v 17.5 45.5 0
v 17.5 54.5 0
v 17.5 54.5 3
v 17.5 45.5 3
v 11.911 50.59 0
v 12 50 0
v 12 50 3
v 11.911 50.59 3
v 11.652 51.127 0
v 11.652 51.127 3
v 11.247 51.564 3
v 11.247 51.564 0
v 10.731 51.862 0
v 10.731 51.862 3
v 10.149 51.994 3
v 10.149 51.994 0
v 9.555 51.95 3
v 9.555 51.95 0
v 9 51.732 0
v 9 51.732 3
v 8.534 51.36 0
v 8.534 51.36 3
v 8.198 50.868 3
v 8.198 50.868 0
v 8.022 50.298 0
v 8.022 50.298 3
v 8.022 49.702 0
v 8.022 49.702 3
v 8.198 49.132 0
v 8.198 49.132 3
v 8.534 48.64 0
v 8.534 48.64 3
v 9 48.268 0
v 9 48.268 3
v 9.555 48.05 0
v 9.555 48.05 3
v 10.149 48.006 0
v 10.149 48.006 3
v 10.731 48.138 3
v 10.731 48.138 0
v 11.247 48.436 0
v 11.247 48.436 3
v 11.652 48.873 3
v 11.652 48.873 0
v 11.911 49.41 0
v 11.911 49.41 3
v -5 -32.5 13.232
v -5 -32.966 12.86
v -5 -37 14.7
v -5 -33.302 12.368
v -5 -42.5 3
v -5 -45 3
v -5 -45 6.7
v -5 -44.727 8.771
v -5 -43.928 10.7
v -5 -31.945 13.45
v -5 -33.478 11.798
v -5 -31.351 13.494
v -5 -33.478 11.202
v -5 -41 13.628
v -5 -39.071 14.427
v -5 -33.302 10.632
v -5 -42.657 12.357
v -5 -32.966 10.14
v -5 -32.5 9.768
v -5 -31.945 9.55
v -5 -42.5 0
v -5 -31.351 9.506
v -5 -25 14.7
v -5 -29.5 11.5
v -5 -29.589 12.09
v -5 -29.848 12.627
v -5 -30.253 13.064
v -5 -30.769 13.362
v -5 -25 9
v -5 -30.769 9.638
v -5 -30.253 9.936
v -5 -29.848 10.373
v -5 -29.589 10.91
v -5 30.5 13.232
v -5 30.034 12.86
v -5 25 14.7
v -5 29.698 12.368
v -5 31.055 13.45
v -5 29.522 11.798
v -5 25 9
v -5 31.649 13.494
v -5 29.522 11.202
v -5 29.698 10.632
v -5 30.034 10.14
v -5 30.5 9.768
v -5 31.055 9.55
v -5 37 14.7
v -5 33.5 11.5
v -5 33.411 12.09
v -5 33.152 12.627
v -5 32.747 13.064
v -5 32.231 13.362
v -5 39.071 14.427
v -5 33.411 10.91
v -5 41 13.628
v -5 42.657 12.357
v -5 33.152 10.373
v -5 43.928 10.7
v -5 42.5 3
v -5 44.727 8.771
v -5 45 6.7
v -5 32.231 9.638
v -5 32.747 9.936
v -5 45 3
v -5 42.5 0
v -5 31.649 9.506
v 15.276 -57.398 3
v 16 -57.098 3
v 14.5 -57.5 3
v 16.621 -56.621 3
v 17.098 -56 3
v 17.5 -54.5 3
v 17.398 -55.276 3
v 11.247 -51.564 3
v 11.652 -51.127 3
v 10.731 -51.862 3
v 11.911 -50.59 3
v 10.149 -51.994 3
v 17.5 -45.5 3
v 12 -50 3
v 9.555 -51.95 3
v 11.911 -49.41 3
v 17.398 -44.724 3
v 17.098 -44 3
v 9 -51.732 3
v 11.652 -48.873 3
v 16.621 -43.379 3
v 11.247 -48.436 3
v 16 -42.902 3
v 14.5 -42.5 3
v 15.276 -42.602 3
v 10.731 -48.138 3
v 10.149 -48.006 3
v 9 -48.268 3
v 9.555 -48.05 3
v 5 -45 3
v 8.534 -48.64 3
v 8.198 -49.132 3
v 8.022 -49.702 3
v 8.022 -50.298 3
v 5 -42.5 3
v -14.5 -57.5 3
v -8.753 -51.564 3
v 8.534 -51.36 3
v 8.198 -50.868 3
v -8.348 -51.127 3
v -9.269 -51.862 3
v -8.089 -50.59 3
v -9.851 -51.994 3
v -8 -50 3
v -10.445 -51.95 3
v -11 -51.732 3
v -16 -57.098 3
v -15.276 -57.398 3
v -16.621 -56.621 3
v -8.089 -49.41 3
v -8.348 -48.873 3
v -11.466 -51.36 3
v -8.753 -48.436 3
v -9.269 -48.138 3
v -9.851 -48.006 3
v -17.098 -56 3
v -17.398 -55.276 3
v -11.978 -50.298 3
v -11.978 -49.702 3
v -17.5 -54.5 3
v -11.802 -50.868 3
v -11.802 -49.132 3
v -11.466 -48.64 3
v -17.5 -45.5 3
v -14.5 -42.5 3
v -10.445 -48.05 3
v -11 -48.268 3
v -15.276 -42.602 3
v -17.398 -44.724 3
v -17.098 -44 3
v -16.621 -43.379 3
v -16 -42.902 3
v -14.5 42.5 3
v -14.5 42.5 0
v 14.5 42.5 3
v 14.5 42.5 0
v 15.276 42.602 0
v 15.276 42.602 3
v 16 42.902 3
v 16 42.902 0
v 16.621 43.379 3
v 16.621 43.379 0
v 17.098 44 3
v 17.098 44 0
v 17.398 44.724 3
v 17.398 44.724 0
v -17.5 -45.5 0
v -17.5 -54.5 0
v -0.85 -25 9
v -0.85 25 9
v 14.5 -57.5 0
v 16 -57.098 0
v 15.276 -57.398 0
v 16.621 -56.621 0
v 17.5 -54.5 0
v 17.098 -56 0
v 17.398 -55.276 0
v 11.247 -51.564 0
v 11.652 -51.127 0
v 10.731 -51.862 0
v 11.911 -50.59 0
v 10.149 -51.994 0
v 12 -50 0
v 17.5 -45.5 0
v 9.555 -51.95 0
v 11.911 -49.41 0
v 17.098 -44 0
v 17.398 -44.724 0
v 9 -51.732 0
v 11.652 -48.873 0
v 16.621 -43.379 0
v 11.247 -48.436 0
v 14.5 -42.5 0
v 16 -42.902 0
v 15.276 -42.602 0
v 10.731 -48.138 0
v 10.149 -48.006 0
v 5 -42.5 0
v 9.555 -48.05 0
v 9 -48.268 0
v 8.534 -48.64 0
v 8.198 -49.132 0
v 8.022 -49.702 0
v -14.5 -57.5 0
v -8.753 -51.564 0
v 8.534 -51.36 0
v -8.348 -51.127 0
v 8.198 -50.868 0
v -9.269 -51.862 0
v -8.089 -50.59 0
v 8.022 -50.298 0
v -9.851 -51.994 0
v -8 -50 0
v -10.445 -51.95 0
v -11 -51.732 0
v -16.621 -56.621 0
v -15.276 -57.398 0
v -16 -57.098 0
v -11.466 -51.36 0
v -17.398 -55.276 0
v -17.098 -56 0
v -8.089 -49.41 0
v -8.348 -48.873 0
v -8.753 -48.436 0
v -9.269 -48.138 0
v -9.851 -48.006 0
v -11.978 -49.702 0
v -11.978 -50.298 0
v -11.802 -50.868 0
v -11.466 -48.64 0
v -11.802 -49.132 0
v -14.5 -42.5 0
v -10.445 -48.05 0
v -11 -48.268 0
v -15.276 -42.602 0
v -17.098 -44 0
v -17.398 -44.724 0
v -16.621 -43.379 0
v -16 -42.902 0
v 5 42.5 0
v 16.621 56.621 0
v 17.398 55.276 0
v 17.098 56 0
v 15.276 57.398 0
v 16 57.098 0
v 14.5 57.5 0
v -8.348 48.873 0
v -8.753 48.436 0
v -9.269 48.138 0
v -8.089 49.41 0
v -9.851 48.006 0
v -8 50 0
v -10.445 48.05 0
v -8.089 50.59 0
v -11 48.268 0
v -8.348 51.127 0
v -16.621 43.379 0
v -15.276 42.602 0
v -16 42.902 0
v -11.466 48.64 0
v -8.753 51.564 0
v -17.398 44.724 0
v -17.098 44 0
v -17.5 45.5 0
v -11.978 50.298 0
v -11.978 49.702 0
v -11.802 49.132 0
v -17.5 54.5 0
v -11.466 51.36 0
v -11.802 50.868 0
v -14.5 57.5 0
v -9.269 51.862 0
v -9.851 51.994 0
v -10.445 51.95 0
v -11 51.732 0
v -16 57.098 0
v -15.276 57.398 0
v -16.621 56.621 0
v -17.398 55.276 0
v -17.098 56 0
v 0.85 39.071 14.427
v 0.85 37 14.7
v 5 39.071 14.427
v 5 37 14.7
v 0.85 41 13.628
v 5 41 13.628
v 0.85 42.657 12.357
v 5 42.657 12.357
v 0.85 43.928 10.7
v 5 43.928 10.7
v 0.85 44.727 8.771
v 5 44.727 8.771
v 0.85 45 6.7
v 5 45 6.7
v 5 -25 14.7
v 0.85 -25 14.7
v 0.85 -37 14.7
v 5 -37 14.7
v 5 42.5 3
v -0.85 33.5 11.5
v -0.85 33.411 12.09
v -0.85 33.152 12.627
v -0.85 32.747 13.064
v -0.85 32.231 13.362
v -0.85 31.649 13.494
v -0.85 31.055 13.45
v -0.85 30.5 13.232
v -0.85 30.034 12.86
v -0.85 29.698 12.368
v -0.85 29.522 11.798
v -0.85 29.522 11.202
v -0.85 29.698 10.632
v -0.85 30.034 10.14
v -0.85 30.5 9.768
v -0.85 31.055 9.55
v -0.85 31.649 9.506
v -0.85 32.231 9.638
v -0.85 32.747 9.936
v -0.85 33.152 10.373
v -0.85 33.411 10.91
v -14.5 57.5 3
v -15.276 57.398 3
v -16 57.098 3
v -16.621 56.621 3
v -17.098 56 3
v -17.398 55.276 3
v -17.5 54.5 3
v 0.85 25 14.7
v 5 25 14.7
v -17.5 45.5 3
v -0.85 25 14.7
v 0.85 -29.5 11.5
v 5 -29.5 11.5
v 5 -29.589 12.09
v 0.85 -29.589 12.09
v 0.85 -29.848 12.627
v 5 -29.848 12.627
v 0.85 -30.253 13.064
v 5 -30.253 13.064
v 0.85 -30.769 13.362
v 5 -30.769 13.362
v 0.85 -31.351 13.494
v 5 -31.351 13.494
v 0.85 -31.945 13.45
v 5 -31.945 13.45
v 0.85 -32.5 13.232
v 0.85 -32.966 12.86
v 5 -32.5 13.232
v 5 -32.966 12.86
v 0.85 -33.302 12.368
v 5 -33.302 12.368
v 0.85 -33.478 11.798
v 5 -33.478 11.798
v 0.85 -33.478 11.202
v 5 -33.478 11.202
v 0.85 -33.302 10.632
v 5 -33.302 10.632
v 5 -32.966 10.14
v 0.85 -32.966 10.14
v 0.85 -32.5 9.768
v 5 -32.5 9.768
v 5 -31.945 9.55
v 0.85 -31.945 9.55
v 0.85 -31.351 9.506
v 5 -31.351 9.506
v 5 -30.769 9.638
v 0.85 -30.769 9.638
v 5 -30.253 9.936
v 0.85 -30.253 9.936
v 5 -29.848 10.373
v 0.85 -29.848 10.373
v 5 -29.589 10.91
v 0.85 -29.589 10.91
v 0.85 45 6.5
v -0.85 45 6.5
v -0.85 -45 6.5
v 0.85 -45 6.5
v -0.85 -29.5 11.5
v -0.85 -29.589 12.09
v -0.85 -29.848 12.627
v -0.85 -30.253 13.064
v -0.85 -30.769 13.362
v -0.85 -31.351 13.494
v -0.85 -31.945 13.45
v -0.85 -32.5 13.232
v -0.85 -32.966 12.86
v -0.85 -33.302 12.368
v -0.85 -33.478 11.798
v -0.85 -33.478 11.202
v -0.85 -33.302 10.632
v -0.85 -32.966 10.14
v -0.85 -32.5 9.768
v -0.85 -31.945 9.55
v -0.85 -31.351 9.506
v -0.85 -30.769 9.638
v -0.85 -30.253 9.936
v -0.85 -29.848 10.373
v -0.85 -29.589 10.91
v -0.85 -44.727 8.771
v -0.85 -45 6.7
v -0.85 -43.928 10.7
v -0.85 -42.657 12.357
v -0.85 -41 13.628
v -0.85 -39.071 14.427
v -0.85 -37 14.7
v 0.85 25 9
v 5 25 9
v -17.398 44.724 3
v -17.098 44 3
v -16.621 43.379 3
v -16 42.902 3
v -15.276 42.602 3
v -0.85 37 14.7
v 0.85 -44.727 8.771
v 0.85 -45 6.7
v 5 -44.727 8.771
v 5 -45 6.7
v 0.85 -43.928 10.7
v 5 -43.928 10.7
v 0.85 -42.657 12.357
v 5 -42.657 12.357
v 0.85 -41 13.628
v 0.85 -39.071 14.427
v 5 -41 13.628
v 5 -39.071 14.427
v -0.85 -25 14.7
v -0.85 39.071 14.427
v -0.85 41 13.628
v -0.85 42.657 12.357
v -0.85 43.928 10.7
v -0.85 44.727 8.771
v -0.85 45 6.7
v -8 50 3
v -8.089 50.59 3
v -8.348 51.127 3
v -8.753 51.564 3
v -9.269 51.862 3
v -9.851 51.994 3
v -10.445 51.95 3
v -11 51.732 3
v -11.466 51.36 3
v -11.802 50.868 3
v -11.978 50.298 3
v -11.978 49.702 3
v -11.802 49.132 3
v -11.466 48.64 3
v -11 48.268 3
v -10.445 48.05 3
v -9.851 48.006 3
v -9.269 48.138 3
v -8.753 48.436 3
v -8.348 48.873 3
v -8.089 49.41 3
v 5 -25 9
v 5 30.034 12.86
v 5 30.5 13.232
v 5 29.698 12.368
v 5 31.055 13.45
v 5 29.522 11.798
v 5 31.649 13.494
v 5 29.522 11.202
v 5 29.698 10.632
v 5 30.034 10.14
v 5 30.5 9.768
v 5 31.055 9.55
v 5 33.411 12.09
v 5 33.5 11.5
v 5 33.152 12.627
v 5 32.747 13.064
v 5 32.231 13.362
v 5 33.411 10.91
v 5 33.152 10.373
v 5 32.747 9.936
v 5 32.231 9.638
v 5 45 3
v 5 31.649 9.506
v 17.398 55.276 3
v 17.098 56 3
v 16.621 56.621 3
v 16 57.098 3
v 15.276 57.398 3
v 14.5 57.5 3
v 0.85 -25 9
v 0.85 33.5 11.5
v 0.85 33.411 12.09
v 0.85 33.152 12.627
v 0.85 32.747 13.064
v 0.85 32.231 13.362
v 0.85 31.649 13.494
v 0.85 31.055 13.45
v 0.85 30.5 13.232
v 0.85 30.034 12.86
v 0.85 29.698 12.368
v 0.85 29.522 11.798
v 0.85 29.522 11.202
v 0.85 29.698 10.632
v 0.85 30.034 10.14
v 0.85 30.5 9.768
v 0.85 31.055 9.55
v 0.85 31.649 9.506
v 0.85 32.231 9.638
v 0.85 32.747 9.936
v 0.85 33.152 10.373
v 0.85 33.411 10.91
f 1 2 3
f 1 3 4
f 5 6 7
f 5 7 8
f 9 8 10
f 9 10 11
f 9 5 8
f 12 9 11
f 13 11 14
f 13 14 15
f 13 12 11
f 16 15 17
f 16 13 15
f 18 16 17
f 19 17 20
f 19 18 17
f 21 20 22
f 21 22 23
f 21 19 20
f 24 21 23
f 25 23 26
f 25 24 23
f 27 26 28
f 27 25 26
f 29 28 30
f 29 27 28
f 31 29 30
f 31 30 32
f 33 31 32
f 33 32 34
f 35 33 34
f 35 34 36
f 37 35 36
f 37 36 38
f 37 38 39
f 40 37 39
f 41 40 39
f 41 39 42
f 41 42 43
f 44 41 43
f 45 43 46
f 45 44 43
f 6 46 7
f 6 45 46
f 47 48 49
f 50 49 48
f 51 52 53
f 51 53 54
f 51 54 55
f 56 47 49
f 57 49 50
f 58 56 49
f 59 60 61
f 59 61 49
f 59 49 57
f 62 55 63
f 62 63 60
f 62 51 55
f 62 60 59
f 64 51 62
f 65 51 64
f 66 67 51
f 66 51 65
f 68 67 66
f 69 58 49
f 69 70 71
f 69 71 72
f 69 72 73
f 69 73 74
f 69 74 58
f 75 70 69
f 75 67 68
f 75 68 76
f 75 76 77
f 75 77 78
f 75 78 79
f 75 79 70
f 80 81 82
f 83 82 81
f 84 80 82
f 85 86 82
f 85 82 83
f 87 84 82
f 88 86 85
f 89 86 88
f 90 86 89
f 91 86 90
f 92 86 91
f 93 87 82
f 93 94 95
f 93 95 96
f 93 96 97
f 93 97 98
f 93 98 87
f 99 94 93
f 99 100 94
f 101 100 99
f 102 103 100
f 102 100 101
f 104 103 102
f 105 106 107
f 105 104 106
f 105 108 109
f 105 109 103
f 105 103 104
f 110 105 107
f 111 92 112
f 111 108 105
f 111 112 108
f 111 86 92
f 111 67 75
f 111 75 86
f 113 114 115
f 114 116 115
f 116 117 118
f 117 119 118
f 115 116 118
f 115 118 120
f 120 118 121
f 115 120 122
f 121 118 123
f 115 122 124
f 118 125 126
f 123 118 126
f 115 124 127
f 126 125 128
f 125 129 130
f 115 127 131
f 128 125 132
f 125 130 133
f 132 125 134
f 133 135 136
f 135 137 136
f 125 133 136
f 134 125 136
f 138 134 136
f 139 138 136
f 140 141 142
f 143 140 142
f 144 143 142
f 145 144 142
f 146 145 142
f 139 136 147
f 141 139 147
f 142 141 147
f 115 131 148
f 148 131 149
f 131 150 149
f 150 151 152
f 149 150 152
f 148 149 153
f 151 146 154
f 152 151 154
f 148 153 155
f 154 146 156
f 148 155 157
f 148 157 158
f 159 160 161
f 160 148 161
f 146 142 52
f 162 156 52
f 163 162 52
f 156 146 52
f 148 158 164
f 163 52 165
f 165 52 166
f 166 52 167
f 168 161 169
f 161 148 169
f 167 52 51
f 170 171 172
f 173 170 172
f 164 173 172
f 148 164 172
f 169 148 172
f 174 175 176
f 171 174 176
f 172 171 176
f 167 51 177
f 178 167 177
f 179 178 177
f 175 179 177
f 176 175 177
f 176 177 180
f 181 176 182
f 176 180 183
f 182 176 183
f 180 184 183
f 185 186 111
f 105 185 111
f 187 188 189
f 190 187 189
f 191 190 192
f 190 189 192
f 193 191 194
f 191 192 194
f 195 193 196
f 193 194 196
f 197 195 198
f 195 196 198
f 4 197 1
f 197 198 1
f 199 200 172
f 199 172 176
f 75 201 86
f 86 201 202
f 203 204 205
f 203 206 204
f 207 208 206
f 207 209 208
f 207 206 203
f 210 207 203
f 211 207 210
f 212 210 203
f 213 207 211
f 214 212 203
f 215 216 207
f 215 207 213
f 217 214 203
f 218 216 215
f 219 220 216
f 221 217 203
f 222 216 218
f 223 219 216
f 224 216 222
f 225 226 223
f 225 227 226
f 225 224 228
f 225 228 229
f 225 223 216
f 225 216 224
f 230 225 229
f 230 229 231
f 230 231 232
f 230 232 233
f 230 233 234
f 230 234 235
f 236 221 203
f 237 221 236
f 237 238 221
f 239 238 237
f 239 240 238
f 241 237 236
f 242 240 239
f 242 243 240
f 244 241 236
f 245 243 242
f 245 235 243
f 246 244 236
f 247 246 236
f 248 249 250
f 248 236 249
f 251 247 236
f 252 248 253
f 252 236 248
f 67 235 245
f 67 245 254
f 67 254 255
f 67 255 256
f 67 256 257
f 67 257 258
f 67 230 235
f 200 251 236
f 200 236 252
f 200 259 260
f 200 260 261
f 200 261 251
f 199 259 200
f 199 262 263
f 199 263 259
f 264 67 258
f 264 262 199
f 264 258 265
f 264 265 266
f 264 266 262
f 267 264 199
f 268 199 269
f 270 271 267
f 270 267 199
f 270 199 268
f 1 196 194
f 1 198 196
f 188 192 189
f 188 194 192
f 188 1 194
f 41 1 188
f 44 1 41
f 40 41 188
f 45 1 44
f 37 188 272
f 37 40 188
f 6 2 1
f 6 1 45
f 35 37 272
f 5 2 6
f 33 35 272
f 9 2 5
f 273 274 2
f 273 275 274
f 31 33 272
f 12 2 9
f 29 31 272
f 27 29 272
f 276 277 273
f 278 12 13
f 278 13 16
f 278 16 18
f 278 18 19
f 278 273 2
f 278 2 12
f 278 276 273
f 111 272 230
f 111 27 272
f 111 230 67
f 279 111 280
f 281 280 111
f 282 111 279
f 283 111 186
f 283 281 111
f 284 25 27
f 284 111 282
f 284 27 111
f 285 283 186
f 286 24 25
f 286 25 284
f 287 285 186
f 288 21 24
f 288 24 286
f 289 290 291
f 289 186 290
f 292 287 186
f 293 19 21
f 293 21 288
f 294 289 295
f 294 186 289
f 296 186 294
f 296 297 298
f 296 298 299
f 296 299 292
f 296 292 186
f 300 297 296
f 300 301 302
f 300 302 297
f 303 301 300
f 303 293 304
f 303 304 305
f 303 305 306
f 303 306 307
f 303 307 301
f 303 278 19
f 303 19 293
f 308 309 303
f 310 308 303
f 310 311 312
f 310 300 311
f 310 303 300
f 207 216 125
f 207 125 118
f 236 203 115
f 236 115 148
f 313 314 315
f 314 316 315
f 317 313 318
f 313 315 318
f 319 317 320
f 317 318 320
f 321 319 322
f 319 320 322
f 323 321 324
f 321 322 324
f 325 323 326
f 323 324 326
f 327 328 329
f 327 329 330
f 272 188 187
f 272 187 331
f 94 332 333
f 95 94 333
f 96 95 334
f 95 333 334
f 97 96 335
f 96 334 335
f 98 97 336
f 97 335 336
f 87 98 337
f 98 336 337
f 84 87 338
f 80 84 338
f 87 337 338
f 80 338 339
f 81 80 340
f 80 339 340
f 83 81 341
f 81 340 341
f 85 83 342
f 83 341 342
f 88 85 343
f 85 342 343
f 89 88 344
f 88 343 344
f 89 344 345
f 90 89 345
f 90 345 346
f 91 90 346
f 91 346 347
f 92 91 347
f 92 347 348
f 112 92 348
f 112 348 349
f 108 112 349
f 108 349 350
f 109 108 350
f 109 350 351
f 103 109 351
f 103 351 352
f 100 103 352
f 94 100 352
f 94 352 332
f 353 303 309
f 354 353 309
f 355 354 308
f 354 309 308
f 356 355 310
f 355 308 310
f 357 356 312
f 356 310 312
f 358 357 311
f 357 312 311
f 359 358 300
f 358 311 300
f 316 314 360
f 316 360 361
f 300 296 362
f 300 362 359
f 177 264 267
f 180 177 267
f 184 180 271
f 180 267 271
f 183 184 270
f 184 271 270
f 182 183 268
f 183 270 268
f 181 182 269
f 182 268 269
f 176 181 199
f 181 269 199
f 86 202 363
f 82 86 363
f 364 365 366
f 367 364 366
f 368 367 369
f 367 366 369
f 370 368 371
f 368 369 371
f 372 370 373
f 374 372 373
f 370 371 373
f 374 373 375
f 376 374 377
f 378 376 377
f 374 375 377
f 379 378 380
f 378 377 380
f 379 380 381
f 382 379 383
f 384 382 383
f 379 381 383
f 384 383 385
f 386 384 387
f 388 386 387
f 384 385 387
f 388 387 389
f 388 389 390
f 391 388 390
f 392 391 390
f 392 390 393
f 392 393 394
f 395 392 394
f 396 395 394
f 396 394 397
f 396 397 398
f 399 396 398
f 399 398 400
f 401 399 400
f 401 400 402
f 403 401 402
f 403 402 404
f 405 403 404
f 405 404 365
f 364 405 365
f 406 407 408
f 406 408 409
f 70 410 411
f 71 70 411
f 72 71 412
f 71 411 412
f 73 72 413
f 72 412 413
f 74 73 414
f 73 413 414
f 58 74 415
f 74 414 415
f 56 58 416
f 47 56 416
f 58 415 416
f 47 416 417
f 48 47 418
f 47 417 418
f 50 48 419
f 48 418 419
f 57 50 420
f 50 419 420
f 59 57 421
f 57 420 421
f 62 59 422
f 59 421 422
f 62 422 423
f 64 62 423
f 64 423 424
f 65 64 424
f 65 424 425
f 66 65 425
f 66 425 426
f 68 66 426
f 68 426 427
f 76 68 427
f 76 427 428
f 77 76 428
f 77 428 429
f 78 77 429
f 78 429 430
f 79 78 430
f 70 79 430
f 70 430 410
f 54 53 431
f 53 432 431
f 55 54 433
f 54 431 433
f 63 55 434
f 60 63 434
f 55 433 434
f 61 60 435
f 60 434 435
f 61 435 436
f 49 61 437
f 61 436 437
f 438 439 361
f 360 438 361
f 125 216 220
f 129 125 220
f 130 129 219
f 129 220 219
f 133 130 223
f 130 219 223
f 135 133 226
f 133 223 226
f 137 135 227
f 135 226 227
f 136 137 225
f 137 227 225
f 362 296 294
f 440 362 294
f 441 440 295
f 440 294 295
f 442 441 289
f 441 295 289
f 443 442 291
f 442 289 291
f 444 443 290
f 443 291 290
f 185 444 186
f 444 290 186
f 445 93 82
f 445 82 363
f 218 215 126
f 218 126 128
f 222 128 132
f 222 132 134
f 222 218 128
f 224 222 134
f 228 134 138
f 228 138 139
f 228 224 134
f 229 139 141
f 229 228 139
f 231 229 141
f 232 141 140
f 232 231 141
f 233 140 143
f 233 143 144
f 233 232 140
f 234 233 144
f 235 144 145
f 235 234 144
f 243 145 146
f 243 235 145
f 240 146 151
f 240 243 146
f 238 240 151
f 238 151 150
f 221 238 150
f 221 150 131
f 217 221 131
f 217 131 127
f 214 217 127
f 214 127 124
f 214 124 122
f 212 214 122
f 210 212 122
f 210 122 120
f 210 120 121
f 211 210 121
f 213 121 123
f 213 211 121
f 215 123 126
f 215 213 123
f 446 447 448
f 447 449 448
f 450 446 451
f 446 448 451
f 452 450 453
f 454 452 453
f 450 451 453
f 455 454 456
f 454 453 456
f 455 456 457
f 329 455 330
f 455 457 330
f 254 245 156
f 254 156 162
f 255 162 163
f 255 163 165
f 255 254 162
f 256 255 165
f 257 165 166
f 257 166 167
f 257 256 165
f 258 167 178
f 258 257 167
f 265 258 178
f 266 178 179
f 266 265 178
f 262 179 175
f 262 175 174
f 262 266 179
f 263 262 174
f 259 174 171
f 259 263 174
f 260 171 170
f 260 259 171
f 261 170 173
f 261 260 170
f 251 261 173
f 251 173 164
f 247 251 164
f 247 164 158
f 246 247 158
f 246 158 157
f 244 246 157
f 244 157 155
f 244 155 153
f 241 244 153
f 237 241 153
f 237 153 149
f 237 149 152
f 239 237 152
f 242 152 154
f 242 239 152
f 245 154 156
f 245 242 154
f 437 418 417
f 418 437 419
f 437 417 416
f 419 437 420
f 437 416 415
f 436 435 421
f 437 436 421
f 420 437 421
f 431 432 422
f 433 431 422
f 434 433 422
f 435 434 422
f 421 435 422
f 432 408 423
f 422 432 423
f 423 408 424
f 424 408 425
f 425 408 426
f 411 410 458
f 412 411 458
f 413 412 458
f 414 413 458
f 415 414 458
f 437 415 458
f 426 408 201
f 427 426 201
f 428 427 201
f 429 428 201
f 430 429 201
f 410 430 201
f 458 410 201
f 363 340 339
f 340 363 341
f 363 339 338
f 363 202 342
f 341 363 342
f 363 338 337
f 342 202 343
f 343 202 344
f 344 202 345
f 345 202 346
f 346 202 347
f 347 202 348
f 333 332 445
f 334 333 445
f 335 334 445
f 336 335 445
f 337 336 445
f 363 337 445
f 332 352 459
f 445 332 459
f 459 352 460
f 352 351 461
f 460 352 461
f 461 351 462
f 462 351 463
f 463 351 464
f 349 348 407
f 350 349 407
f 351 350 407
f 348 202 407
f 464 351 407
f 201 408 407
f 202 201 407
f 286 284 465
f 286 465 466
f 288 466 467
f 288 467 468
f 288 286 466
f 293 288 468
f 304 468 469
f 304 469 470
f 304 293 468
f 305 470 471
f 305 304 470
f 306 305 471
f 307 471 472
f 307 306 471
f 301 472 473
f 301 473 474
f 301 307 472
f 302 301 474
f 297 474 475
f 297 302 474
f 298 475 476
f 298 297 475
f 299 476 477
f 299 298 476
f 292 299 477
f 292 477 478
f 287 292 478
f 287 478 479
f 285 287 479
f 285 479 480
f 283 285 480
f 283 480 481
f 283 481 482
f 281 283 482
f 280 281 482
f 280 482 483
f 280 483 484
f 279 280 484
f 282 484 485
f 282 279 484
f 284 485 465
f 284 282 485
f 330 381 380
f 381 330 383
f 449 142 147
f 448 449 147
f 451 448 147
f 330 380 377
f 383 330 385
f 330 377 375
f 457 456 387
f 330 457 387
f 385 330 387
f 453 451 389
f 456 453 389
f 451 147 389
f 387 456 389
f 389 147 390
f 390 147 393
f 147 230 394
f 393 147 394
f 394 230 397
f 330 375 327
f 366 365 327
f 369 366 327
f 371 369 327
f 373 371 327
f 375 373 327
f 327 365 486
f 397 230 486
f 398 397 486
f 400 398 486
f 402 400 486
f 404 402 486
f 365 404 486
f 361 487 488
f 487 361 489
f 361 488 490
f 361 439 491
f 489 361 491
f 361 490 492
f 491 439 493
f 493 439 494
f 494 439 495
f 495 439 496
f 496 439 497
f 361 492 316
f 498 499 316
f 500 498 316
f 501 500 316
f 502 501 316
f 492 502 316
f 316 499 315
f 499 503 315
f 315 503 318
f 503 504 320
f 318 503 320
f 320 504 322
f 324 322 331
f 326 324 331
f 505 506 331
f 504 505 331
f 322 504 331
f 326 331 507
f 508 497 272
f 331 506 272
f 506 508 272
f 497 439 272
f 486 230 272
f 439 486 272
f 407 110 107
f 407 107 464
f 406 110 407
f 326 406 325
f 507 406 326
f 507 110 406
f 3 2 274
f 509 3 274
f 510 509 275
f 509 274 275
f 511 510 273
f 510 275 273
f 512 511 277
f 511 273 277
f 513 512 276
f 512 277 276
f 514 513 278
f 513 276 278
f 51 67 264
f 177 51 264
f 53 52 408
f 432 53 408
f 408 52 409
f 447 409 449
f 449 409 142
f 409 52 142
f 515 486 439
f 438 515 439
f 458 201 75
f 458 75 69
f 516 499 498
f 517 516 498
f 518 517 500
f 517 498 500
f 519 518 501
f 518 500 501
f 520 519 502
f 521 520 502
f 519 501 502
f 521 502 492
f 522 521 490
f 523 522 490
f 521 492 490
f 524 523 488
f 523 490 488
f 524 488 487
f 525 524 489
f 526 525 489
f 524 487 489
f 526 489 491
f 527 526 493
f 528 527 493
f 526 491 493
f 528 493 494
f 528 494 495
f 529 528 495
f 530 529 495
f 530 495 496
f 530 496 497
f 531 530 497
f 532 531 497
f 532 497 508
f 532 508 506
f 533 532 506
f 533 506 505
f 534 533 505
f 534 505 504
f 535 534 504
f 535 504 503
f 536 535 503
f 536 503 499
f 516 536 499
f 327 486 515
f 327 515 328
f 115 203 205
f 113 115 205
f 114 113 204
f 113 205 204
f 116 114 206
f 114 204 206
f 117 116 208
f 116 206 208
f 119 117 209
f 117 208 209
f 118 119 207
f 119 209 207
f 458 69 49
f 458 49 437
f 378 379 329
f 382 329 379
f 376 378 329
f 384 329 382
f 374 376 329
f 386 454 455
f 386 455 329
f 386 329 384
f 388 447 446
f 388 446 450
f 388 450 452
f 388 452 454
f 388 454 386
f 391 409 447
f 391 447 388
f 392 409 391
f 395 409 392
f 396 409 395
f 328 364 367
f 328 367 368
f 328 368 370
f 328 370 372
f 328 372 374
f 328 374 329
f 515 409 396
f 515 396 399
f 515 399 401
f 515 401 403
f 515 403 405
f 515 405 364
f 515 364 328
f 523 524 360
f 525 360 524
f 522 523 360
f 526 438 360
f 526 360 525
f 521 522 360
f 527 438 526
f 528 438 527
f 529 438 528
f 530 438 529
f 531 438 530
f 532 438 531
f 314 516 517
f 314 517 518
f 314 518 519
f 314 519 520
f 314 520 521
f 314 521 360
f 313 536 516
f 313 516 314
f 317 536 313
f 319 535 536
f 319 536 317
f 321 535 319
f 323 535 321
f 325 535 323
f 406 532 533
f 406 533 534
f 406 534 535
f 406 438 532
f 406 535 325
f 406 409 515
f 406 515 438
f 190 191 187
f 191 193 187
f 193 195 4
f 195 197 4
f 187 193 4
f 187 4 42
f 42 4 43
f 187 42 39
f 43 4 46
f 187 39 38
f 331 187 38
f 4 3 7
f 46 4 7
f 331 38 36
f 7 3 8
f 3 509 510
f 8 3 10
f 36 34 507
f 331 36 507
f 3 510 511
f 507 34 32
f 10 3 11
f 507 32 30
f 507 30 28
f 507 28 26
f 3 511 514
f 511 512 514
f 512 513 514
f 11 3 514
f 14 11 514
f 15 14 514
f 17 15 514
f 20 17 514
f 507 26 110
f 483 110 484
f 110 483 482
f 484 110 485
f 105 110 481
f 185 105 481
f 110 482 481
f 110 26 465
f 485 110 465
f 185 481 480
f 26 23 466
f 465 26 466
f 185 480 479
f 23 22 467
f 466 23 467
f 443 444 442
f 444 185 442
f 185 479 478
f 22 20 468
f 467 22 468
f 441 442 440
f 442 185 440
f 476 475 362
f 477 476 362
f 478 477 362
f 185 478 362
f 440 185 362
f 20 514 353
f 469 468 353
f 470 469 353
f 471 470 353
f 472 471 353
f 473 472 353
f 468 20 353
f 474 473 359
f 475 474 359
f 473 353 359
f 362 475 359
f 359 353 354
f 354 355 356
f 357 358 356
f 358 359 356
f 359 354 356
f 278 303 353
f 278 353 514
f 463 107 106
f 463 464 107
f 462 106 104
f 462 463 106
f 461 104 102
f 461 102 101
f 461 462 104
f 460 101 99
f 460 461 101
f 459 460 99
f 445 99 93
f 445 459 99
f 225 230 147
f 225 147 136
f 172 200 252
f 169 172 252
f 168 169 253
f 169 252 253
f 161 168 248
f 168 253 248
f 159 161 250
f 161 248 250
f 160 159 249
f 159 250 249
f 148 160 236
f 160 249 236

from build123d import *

# Parameters (mm, degrees)
SKETCH_R     = 2
PAD_DEPTH    = 3
SKETCH001_W  = 4.15
SKETCH001_H  = 90
PAD001_DEPTH = 11.7
SKETCH002_R  = 2
SKETCH002_W  = 50
SKETCH002_H  = 6
POCKET_DEPTH = 15
SKETCH003_W  = 4.09
SKETCH003_H  = 90
PAD002_DEPTH = 3.5
FILLET_R     = 8


with BuildPart() as part:
    # Sketch → Pad (new body)
    with BuildSketch(Plane.XY):
        with BuildLine():
            Line((-14.5, 57.5), (14.5, 57.5))
            ThreePointArc((17.5, 54.5), (16.62132, 56.62132), (14.5, 57.5))
            Line((17.5, 54.5), (17.5, 45.5))
            ThreePointArc((14.5, 42.5), (16.62132, 43.37868), (17.5, 45.5))
            Line((14.5, 42.5), (5, 42.5))
            Line((5, 42.5), (5, -42.5))
            Line((5, -42.5), (14.5, -42.5))
            ThreePointArc((17.5, -45.5), (16.62132, -43.37868), (14.5, -42.5))
            Line((17.5, -45.5), (17.5, -54.5))
            ThreePointArc((14.5, -57.5), (16.62132, -56.62132), (17.5, -54.5))
            Line((14.5, -57.5), (-14.5, -57.5))
            ThreePointArc((-17.5, -54.5), (-16.62132, -56.62132), (-14.5, -57.5))
            Line((-17.5, -54.5), (-17.5, -45.5))
            ThreePointArc((-14.5, -42.5), (-16.62132, -43.37868), (-17.5, -45.5))
            Line((-5, -42.5), (-14.5, -42.5))
            Line((-5, 42.5), (-5, -42.5))
            Line((-14.5, 42.5), (-5, 42.5))
            ThreePointArc((-17.5, 45.5), (-16.62132, 43.37868), (-14.5, 42.5))
            Line((-17.5, 45.5), (-17.5, 54.5))
            ThreePointArc((-14.5, 57.5), (-16.62132, 56.62132), (-17.5, 54.5))
        make_face()
        with Locations((-10, 50)):
            Circle(SKETCH_R, mode=Mode.SUBTRACT)
        with Locations((10, 50)):
            Circle(SKETCH_R, mode=Mode.SUBTRACT)
        with Locations((-10, -50)):
            Circle(SKETCH_R, mode=Mode.SUBTRACT)
        with Locations((10, -50)):
            Circle(SKETCH_R, mode=Mode.SUBTRACT)
    extrude(amount=PAD_DEPTH)

    # Sketch001 → Pad001 (join)
    with BuildSketch(Plane.XY.offset(3)):
        with Locations((-2.925, 0)):
            Rectangle(SKETCH001_W, SKETCH001_H)
        with Locations((2.925, 0)):
            Rectangle(SKETCH001_W, SKETCH001_H)
    extrude(amount=PAD001_DEPTH)

    # Sketch002 → Pocket (cut)
    with BuildSketch(Plane.YZ.offset(5)):
        with Locations((-31.5, 11.5)):
            Circle(SKETCH002_R)
        with Locations((31.5, 11.5)):
            Circle(SKETCH002_R)
        with Locations((0, 12)):
            Rectangle(SKETCH002_W, SKETCH002_H)
    extrude(amount=-POCKET_DEPTH, mode=Mode.SUBTRACT)

    # Sketch003 → Pad002 (join)
    with BuildSketch(Plane.XY.offset(3)):
        with Locations((0.341939, 0)):
            Rectangle(SKETCH003_W, SKETCH003_H)
    extrude(amount=PAD002_DEPTH)

    # Fillet
    fillet_edges = [part.edges().sort_by_distance(p)[0] for p in [
        (-2.925, -45, 14.7),
        (2.925, -45, 14.7),
        (2.925, 45, 14.7),
        (-2.925, 45, 14.7),
    ]]
    fillet(fillet_edges, radius=FILLET_R)


solid = part.part
